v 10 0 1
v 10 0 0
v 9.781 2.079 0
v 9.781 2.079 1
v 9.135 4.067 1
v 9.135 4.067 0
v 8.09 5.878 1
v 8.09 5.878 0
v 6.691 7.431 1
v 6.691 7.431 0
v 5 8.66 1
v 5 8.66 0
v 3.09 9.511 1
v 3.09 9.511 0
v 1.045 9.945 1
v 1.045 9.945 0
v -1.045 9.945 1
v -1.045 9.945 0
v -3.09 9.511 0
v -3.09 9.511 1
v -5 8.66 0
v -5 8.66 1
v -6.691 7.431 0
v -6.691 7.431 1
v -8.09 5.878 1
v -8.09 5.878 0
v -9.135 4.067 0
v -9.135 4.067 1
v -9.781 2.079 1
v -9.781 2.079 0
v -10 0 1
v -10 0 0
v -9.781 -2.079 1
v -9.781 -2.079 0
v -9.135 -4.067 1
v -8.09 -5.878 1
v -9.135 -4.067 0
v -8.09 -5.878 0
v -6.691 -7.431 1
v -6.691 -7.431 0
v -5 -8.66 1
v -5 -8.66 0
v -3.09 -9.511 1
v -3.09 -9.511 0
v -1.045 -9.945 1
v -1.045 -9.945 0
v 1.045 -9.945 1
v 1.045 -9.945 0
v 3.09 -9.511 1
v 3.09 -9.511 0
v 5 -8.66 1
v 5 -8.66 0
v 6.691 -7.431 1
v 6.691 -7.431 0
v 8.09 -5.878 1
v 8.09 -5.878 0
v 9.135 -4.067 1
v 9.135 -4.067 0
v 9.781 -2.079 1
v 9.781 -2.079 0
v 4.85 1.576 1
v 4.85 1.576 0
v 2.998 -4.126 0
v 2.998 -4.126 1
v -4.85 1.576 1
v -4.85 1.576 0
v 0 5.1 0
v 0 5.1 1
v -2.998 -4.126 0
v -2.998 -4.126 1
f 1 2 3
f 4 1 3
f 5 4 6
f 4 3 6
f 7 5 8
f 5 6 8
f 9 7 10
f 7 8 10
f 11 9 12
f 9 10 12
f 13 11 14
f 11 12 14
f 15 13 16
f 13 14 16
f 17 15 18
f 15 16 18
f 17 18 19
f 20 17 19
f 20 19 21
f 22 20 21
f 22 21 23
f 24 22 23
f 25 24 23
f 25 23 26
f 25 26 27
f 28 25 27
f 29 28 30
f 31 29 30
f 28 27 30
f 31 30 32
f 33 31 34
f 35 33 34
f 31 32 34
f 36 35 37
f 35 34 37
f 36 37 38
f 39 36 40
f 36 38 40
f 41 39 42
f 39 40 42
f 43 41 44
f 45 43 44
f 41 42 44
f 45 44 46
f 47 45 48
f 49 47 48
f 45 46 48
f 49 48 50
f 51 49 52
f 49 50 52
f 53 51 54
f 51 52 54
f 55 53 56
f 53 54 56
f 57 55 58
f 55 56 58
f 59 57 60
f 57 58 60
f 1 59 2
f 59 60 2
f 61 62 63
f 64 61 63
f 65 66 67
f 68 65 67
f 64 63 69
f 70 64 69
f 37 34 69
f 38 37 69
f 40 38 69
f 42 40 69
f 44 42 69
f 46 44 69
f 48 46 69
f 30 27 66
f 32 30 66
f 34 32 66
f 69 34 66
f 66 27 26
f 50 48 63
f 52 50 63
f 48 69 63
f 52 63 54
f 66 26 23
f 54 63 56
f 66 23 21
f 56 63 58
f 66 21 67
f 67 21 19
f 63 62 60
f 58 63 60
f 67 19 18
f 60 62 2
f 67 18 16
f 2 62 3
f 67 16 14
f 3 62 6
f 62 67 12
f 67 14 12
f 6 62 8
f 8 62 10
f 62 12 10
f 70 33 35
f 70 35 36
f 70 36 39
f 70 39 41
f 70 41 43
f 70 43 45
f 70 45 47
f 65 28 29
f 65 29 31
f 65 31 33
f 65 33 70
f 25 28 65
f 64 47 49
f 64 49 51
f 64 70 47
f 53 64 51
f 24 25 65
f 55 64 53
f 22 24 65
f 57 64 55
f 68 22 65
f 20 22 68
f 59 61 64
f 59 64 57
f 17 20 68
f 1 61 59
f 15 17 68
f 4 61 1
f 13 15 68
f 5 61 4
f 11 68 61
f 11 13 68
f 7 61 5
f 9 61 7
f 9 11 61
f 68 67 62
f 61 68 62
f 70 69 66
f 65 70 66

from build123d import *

# Parameters (mm, degrees)
F0_R     = 10
F1_DEPTH = 1


with BuildPart() as f1:
    # F0 (on Top) → F1 (new body)
    with BuildSketch(Plane.XY):
        Circle(F0_R)
        Polygon((0, 5.1), (4.850388, 1.575987), (2.997705, -4.125987), (-2.997705, -4.125987), (-4.850388, 1.575987), align=None, mode=Mode.SUBTRACT)
    extrude(amount=F1_DEPTH)


solid = f1.part
